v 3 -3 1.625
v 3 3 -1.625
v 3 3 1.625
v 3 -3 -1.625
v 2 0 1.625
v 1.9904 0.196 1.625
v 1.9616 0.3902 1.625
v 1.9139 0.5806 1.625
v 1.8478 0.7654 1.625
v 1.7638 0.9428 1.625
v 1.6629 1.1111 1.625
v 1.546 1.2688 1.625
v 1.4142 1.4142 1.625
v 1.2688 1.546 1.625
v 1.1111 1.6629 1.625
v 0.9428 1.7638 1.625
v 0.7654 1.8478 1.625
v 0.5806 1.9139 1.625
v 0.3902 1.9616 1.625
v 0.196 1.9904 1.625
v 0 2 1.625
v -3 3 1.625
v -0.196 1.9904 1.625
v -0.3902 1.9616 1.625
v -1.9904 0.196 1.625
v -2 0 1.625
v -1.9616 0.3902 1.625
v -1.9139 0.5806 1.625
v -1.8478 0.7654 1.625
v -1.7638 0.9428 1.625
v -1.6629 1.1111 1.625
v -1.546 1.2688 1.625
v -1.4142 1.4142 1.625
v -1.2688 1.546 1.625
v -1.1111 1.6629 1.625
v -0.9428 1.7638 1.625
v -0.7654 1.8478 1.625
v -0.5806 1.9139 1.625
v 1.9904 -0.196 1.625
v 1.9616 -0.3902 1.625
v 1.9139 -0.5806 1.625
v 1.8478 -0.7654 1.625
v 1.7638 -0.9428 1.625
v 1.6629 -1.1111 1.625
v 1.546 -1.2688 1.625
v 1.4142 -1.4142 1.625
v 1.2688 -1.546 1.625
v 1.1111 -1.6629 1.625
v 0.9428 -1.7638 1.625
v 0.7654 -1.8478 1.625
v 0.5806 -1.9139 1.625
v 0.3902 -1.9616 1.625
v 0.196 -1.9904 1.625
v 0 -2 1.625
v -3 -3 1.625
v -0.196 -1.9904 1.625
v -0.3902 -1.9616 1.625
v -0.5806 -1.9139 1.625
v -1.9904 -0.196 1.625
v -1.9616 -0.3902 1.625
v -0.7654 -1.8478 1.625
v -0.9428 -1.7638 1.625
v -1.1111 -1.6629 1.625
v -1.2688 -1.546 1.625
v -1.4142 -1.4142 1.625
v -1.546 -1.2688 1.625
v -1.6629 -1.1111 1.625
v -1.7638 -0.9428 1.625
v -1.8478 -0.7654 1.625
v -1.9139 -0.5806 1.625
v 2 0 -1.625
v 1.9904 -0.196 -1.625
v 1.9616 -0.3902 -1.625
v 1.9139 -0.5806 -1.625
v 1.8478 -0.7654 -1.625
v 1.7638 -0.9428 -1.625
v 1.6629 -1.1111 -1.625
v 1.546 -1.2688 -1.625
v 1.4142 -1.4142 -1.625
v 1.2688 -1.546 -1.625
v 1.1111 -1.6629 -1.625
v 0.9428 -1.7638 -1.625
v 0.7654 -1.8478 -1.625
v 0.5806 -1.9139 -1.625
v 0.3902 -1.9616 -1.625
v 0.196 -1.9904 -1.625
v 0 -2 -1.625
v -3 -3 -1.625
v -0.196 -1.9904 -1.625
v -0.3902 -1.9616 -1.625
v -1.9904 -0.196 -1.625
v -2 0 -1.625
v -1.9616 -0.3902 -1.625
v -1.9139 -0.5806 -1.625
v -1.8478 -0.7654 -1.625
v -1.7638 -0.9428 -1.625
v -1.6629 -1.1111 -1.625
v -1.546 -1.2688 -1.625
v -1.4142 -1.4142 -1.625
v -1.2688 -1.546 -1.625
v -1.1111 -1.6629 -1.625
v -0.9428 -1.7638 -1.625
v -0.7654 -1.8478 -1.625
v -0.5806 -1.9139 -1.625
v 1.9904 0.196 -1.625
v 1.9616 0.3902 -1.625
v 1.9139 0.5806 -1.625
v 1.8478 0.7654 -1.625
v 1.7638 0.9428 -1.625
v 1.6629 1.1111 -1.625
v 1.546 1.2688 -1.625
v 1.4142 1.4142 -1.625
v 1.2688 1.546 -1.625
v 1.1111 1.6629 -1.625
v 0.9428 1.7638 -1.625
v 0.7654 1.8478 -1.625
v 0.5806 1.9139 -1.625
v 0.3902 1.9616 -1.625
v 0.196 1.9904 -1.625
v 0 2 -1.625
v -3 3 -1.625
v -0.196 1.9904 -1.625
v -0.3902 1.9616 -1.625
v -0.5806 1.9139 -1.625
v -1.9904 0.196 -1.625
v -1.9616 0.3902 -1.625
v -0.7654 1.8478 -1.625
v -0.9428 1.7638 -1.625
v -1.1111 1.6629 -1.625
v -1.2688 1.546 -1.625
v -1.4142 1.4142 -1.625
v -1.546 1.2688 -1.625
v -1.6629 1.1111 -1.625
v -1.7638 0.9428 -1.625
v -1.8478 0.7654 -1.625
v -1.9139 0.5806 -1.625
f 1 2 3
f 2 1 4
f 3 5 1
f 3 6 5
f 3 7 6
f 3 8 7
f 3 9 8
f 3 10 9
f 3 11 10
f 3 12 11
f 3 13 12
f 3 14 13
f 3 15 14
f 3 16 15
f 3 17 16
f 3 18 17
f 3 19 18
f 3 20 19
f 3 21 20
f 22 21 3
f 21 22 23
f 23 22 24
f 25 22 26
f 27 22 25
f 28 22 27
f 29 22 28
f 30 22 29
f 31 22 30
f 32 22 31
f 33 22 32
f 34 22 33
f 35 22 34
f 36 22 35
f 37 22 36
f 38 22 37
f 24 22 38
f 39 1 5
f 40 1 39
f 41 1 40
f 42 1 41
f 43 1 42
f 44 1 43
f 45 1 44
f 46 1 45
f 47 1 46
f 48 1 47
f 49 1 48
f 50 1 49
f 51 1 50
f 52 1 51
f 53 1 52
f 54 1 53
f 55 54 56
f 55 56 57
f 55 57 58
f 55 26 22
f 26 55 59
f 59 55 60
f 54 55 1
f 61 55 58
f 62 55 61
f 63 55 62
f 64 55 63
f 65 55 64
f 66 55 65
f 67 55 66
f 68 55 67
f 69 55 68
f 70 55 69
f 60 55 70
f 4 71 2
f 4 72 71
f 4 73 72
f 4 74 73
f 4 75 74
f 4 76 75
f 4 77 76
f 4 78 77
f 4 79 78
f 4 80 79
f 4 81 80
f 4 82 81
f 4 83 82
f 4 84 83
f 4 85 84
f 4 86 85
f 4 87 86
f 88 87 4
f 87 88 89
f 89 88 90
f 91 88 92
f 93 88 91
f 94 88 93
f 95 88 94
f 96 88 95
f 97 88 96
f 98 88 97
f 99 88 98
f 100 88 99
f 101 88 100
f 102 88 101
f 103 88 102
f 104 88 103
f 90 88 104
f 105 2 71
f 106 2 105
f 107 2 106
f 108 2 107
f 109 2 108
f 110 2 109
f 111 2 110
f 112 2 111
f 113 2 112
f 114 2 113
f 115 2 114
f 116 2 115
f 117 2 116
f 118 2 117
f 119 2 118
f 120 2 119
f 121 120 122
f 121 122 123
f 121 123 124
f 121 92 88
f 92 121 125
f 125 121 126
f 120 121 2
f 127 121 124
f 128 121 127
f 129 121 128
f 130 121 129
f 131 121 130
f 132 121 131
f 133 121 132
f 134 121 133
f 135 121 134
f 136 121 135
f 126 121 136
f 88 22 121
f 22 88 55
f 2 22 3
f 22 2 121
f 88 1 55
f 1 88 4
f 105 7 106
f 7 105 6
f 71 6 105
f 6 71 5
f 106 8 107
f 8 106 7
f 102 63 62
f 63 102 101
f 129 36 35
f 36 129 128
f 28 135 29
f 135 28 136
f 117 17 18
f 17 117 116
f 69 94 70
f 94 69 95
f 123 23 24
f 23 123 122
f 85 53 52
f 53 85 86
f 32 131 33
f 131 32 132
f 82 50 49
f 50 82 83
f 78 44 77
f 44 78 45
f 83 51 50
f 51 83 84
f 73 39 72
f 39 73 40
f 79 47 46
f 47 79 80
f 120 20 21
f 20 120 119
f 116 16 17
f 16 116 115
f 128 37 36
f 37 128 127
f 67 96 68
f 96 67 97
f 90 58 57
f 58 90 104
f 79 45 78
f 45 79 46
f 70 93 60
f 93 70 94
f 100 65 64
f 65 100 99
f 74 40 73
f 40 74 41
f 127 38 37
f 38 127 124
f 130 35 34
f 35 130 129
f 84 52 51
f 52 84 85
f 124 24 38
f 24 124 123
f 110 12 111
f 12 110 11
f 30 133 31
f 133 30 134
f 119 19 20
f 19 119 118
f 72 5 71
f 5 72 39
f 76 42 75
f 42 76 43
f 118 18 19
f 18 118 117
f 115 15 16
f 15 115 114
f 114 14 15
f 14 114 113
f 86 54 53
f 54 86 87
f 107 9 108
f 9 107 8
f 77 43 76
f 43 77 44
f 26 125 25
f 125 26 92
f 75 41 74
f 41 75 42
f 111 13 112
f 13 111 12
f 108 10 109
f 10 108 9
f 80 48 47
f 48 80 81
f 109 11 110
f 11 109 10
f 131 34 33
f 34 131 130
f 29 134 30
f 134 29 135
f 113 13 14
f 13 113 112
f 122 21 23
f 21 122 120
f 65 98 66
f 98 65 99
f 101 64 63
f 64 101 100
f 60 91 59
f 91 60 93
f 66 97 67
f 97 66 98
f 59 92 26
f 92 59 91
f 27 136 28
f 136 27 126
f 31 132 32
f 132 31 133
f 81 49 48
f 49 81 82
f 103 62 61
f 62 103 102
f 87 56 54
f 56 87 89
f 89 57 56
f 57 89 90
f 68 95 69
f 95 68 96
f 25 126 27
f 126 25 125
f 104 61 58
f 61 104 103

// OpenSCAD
module t_slot_nut() {
    difference() {
        // Main body of the T-slot nut
        cube([6.0, 6.0, 3.25], center = true);
        
        // Hole for the screw
        translate([0, 0, -3.25])
            cylinder(h = 6.5, d = 4.0, $fn = 64);
    }
}

t_slot_nut();
